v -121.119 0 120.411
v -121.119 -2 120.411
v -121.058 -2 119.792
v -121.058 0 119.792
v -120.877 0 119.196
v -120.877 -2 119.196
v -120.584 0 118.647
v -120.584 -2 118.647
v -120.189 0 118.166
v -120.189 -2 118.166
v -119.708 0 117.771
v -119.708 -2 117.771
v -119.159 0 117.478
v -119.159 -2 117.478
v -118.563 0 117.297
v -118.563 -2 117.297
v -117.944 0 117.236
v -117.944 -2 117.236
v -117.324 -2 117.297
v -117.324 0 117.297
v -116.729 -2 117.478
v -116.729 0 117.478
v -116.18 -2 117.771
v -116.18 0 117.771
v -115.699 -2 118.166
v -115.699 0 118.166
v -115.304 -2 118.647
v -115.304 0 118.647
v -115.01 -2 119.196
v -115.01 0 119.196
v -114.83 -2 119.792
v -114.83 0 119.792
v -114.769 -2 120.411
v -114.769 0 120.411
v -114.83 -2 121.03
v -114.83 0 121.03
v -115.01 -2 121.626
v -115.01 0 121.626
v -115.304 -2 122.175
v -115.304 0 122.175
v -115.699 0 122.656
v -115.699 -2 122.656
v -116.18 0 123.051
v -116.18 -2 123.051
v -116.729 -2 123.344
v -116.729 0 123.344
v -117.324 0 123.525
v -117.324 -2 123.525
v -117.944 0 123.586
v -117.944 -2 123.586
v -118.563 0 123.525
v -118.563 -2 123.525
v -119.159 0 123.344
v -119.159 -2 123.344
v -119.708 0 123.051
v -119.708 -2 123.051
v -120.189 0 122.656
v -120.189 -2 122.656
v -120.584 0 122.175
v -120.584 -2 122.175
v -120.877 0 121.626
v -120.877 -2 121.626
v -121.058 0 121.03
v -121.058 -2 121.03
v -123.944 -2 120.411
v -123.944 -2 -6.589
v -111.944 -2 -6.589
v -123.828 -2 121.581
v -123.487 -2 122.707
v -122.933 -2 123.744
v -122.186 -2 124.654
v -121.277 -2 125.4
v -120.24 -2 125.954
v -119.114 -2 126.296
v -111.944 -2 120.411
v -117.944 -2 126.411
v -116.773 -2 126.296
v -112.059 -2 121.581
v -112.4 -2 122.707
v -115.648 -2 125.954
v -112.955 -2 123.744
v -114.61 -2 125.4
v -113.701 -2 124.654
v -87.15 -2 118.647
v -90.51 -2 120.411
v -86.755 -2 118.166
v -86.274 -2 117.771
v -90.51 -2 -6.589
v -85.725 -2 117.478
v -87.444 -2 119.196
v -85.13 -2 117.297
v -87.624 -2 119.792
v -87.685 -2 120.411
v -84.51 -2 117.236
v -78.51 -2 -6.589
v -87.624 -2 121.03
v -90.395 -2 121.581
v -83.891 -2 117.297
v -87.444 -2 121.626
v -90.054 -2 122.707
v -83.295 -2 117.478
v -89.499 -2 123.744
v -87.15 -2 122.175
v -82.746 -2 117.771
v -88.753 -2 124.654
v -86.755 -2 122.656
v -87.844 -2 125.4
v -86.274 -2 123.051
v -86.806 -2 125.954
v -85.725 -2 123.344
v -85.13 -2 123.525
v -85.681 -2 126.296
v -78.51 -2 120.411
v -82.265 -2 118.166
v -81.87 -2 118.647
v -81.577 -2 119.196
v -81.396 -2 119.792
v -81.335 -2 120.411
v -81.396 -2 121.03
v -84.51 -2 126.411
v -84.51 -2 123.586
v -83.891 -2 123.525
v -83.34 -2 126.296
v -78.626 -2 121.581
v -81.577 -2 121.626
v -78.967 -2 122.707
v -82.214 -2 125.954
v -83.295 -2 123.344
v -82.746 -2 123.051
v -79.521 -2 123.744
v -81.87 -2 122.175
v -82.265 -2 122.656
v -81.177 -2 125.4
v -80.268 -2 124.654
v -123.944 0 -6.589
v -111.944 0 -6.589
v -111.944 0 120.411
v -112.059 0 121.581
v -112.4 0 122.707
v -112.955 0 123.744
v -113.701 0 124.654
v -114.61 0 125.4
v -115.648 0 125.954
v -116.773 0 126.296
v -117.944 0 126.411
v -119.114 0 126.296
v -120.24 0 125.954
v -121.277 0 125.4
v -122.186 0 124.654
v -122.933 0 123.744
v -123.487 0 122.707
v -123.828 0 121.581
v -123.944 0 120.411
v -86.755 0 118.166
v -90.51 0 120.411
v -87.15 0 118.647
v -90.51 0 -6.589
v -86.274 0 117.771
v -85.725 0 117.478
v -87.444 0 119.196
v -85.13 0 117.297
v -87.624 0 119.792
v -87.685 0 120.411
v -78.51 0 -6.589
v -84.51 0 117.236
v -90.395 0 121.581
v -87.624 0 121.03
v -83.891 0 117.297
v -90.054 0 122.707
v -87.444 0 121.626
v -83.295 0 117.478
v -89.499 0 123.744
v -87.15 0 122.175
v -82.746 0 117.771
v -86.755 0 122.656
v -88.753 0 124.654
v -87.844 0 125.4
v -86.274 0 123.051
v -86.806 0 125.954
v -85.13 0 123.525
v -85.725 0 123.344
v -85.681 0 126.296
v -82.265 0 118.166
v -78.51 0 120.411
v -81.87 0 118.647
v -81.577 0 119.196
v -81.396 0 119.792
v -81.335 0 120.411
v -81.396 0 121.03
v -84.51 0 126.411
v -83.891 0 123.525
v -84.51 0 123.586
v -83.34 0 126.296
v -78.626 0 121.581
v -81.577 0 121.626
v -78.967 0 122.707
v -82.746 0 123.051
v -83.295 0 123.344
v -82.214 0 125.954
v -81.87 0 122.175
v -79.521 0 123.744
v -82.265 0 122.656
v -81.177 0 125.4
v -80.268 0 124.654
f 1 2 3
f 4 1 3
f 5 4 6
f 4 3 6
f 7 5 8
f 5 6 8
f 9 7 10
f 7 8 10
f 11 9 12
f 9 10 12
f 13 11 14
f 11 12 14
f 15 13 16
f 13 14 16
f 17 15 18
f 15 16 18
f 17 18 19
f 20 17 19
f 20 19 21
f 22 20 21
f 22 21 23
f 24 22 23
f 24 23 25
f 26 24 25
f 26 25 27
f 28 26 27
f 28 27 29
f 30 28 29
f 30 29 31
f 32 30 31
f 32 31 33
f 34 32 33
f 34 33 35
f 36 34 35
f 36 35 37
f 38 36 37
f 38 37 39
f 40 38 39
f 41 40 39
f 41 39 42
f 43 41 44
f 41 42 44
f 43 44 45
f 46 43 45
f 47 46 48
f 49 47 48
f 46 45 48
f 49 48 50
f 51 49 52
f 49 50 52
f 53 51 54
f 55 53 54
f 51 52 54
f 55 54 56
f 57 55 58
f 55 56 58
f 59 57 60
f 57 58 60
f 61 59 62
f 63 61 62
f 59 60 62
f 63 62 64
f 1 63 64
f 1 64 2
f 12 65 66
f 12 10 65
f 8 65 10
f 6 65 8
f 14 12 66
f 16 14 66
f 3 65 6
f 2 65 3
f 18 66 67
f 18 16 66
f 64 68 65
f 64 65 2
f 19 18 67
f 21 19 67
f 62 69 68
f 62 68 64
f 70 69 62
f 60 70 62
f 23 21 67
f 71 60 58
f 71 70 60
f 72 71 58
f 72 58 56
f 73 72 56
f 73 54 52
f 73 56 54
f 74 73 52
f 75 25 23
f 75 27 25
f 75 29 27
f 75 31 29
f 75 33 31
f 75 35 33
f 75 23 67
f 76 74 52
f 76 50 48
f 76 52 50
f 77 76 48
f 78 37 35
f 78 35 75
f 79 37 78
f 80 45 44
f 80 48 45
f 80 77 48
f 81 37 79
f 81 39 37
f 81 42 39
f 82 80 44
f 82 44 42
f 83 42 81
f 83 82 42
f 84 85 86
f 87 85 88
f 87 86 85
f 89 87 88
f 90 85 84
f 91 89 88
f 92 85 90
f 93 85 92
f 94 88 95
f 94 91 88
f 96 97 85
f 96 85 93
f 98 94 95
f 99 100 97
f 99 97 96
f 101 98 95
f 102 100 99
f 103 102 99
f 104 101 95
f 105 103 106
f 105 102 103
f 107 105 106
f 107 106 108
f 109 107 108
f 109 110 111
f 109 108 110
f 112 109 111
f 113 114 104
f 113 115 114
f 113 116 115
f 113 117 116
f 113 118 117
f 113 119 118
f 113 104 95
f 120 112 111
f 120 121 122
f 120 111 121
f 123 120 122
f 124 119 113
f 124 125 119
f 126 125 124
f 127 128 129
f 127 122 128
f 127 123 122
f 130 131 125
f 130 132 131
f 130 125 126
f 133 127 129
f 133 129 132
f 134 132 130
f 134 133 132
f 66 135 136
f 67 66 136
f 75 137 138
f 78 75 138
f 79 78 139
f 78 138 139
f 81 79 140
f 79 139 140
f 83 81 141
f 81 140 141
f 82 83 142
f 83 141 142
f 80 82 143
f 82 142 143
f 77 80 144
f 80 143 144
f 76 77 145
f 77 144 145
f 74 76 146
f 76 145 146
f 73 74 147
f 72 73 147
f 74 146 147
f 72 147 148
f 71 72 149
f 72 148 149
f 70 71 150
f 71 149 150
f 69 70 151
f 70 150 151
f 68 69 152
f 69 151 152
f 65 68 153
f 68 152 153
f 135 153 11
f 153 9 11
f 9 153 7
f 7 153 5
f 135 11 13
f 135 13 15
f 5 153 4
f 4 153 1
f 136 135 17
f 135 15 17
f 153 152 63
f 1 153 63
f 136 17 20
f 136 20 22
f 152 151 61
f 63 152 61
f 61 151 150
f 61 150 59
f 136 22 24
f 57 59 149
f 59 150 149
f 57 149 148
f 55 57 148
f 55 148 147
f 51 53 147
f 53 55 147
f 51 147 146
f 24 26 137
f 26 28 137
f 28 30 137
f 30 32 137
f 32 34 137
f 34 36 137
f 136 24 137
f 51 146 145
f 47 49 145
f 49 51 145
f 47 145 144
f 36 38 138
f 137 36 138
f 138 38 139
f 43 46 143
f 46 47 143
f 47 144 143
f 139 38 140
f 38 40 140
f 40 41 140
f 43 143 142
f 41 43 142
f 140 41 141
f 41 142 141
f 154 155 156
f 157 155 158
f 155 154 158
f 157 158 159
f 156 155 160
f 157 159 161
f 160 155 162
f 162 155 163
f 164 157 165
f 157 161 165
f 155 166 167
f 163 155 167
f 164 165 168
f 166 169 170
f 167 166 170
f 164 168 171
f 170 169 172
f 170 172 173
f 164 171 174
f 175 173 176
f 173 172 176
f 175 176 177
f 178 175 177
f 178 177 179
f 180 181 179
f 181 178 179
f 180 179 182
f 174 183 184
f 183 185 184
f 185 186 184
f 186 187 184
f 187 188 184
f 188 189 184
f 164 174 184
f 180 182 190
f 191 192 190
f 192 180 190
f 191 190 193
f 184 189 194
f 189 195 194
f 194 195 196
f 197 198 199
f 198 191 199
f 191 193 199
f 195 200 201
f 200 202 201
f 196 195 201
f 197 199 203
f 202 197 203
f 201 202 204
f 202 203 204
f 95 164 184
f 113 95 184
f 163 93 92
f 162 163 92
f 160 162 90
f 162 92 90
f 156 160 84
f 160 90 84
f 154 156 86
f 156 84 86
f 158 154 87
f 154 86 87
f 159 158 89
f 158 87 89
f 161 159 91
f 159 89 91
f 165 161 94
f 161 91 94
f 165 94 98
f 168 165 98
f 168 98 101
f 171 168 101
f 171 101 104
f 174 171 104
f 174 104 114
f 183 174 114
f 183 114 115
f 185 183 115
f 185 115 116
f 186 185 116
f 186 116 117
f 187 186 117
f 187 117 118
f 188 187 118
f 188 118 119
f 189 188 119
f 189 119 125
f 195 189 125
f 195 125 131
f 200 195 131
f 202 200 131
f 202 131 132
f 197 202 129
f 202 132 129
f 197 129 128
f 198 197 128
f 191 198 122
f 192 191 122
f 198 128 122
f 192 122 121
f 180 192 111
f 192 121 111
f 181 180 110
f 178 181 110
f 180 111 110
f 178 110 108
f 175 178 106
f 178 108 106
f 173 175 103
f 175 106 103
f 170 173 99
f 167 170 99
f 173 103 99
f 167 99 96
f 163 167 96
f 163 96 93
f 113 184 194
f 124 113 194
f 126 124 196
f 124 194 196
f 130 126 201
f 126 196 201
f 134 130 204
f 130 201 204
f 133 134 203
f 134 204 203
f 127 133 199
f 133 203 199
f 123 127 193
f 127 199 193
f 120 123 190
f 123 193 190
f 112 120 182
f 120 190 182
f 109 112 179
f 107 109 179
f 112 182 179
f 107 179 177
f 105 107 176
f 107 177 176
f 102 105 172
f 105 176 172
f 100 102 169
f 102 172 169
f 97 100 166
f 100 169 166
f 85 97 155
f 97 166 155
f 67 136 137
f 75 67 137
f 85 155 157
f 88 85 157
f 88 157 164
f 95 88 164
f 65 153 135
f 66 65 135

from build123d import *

# Parameters (mm, degrees)
F0_R     = 2.2225
F1_DEPTH = 2
F2_D     = 6.35
F2_2_D   = 6.35


with BuildPart() as f1:
    # F0 (on Front) → F1 (new body)
    with BuildSketch(Plane.XZ):
        with BuildLine():
            Line((-111.9437609911, -6.5890456444), (-111.9437609911, 120.4109543556))
            ThreePointArc((-111.9437609911, 120.4109543556), (-117.9437609911, 126.4109543556), (-123.9437609911, 120.4109543556))
            Line((-123.9437609911, 120.4109543556), (-123.9437609911, -6.5890456444))
            Line((-123.9437609911, -6.5890456444), (-111.9437609911, -6.5890456444))
        make_face()
        with Locations((-117.9437609911, 120.4109543556)):
            Circle(F0_R, mode=Mode.SUBTRACT)
    extrude(amount=F1_DEPTH)

    # F2 (through all)
    with Locations(Plane(origin=(0, 0, 0), x_dir=(1, 0, 0), z_dir=(0, 1, 0))):
        with Locations((-117.9437609911, -120.4109543556), (-84.5102802153, -120.4109543556)):
            Hole(F2_D / 2)


with BuildPart() as f1b:
    # F0 (on Front) → F1, piece 2 (new body)
    with BuildSketch(Plane.XZ):
        with BuildLine():
            ThreePointArc((-78.5102802153, 120.4109543556), (-84.5102802153, 126.4109543556), (-90.5102802153, 120.4109543556))
            Line((-90.5102802153, 120.4109543556), (-90.5102802153, -6.5890456444))
            Line((-90.5102802153, -6.5890456444), (-78.5102802153, -6.5890456444))
            Line((-78.5102802153, -6.5890456444), (-78.5102802153, 120.4109543556))
        make_face()
        with Locations((-84.5102802153, 120.4109543556)):
            Circle(F0_R, mode=Mode.SUBTRACT)
    extrude(amount=F1_DEPTH)

    # F2#2 (through all)
    with Locations(Plane(origin=(0, 0, 0), x_dir=(1, 0, 0), z_dir=(0, 1, 0))):
        with Locations((-117.9437609911, -120.4109543556), (-84.5102802153, -120.4109543556)):
            Hole(F2_2_D / 2)


solid = Compound([f1.part, f1b.part])
